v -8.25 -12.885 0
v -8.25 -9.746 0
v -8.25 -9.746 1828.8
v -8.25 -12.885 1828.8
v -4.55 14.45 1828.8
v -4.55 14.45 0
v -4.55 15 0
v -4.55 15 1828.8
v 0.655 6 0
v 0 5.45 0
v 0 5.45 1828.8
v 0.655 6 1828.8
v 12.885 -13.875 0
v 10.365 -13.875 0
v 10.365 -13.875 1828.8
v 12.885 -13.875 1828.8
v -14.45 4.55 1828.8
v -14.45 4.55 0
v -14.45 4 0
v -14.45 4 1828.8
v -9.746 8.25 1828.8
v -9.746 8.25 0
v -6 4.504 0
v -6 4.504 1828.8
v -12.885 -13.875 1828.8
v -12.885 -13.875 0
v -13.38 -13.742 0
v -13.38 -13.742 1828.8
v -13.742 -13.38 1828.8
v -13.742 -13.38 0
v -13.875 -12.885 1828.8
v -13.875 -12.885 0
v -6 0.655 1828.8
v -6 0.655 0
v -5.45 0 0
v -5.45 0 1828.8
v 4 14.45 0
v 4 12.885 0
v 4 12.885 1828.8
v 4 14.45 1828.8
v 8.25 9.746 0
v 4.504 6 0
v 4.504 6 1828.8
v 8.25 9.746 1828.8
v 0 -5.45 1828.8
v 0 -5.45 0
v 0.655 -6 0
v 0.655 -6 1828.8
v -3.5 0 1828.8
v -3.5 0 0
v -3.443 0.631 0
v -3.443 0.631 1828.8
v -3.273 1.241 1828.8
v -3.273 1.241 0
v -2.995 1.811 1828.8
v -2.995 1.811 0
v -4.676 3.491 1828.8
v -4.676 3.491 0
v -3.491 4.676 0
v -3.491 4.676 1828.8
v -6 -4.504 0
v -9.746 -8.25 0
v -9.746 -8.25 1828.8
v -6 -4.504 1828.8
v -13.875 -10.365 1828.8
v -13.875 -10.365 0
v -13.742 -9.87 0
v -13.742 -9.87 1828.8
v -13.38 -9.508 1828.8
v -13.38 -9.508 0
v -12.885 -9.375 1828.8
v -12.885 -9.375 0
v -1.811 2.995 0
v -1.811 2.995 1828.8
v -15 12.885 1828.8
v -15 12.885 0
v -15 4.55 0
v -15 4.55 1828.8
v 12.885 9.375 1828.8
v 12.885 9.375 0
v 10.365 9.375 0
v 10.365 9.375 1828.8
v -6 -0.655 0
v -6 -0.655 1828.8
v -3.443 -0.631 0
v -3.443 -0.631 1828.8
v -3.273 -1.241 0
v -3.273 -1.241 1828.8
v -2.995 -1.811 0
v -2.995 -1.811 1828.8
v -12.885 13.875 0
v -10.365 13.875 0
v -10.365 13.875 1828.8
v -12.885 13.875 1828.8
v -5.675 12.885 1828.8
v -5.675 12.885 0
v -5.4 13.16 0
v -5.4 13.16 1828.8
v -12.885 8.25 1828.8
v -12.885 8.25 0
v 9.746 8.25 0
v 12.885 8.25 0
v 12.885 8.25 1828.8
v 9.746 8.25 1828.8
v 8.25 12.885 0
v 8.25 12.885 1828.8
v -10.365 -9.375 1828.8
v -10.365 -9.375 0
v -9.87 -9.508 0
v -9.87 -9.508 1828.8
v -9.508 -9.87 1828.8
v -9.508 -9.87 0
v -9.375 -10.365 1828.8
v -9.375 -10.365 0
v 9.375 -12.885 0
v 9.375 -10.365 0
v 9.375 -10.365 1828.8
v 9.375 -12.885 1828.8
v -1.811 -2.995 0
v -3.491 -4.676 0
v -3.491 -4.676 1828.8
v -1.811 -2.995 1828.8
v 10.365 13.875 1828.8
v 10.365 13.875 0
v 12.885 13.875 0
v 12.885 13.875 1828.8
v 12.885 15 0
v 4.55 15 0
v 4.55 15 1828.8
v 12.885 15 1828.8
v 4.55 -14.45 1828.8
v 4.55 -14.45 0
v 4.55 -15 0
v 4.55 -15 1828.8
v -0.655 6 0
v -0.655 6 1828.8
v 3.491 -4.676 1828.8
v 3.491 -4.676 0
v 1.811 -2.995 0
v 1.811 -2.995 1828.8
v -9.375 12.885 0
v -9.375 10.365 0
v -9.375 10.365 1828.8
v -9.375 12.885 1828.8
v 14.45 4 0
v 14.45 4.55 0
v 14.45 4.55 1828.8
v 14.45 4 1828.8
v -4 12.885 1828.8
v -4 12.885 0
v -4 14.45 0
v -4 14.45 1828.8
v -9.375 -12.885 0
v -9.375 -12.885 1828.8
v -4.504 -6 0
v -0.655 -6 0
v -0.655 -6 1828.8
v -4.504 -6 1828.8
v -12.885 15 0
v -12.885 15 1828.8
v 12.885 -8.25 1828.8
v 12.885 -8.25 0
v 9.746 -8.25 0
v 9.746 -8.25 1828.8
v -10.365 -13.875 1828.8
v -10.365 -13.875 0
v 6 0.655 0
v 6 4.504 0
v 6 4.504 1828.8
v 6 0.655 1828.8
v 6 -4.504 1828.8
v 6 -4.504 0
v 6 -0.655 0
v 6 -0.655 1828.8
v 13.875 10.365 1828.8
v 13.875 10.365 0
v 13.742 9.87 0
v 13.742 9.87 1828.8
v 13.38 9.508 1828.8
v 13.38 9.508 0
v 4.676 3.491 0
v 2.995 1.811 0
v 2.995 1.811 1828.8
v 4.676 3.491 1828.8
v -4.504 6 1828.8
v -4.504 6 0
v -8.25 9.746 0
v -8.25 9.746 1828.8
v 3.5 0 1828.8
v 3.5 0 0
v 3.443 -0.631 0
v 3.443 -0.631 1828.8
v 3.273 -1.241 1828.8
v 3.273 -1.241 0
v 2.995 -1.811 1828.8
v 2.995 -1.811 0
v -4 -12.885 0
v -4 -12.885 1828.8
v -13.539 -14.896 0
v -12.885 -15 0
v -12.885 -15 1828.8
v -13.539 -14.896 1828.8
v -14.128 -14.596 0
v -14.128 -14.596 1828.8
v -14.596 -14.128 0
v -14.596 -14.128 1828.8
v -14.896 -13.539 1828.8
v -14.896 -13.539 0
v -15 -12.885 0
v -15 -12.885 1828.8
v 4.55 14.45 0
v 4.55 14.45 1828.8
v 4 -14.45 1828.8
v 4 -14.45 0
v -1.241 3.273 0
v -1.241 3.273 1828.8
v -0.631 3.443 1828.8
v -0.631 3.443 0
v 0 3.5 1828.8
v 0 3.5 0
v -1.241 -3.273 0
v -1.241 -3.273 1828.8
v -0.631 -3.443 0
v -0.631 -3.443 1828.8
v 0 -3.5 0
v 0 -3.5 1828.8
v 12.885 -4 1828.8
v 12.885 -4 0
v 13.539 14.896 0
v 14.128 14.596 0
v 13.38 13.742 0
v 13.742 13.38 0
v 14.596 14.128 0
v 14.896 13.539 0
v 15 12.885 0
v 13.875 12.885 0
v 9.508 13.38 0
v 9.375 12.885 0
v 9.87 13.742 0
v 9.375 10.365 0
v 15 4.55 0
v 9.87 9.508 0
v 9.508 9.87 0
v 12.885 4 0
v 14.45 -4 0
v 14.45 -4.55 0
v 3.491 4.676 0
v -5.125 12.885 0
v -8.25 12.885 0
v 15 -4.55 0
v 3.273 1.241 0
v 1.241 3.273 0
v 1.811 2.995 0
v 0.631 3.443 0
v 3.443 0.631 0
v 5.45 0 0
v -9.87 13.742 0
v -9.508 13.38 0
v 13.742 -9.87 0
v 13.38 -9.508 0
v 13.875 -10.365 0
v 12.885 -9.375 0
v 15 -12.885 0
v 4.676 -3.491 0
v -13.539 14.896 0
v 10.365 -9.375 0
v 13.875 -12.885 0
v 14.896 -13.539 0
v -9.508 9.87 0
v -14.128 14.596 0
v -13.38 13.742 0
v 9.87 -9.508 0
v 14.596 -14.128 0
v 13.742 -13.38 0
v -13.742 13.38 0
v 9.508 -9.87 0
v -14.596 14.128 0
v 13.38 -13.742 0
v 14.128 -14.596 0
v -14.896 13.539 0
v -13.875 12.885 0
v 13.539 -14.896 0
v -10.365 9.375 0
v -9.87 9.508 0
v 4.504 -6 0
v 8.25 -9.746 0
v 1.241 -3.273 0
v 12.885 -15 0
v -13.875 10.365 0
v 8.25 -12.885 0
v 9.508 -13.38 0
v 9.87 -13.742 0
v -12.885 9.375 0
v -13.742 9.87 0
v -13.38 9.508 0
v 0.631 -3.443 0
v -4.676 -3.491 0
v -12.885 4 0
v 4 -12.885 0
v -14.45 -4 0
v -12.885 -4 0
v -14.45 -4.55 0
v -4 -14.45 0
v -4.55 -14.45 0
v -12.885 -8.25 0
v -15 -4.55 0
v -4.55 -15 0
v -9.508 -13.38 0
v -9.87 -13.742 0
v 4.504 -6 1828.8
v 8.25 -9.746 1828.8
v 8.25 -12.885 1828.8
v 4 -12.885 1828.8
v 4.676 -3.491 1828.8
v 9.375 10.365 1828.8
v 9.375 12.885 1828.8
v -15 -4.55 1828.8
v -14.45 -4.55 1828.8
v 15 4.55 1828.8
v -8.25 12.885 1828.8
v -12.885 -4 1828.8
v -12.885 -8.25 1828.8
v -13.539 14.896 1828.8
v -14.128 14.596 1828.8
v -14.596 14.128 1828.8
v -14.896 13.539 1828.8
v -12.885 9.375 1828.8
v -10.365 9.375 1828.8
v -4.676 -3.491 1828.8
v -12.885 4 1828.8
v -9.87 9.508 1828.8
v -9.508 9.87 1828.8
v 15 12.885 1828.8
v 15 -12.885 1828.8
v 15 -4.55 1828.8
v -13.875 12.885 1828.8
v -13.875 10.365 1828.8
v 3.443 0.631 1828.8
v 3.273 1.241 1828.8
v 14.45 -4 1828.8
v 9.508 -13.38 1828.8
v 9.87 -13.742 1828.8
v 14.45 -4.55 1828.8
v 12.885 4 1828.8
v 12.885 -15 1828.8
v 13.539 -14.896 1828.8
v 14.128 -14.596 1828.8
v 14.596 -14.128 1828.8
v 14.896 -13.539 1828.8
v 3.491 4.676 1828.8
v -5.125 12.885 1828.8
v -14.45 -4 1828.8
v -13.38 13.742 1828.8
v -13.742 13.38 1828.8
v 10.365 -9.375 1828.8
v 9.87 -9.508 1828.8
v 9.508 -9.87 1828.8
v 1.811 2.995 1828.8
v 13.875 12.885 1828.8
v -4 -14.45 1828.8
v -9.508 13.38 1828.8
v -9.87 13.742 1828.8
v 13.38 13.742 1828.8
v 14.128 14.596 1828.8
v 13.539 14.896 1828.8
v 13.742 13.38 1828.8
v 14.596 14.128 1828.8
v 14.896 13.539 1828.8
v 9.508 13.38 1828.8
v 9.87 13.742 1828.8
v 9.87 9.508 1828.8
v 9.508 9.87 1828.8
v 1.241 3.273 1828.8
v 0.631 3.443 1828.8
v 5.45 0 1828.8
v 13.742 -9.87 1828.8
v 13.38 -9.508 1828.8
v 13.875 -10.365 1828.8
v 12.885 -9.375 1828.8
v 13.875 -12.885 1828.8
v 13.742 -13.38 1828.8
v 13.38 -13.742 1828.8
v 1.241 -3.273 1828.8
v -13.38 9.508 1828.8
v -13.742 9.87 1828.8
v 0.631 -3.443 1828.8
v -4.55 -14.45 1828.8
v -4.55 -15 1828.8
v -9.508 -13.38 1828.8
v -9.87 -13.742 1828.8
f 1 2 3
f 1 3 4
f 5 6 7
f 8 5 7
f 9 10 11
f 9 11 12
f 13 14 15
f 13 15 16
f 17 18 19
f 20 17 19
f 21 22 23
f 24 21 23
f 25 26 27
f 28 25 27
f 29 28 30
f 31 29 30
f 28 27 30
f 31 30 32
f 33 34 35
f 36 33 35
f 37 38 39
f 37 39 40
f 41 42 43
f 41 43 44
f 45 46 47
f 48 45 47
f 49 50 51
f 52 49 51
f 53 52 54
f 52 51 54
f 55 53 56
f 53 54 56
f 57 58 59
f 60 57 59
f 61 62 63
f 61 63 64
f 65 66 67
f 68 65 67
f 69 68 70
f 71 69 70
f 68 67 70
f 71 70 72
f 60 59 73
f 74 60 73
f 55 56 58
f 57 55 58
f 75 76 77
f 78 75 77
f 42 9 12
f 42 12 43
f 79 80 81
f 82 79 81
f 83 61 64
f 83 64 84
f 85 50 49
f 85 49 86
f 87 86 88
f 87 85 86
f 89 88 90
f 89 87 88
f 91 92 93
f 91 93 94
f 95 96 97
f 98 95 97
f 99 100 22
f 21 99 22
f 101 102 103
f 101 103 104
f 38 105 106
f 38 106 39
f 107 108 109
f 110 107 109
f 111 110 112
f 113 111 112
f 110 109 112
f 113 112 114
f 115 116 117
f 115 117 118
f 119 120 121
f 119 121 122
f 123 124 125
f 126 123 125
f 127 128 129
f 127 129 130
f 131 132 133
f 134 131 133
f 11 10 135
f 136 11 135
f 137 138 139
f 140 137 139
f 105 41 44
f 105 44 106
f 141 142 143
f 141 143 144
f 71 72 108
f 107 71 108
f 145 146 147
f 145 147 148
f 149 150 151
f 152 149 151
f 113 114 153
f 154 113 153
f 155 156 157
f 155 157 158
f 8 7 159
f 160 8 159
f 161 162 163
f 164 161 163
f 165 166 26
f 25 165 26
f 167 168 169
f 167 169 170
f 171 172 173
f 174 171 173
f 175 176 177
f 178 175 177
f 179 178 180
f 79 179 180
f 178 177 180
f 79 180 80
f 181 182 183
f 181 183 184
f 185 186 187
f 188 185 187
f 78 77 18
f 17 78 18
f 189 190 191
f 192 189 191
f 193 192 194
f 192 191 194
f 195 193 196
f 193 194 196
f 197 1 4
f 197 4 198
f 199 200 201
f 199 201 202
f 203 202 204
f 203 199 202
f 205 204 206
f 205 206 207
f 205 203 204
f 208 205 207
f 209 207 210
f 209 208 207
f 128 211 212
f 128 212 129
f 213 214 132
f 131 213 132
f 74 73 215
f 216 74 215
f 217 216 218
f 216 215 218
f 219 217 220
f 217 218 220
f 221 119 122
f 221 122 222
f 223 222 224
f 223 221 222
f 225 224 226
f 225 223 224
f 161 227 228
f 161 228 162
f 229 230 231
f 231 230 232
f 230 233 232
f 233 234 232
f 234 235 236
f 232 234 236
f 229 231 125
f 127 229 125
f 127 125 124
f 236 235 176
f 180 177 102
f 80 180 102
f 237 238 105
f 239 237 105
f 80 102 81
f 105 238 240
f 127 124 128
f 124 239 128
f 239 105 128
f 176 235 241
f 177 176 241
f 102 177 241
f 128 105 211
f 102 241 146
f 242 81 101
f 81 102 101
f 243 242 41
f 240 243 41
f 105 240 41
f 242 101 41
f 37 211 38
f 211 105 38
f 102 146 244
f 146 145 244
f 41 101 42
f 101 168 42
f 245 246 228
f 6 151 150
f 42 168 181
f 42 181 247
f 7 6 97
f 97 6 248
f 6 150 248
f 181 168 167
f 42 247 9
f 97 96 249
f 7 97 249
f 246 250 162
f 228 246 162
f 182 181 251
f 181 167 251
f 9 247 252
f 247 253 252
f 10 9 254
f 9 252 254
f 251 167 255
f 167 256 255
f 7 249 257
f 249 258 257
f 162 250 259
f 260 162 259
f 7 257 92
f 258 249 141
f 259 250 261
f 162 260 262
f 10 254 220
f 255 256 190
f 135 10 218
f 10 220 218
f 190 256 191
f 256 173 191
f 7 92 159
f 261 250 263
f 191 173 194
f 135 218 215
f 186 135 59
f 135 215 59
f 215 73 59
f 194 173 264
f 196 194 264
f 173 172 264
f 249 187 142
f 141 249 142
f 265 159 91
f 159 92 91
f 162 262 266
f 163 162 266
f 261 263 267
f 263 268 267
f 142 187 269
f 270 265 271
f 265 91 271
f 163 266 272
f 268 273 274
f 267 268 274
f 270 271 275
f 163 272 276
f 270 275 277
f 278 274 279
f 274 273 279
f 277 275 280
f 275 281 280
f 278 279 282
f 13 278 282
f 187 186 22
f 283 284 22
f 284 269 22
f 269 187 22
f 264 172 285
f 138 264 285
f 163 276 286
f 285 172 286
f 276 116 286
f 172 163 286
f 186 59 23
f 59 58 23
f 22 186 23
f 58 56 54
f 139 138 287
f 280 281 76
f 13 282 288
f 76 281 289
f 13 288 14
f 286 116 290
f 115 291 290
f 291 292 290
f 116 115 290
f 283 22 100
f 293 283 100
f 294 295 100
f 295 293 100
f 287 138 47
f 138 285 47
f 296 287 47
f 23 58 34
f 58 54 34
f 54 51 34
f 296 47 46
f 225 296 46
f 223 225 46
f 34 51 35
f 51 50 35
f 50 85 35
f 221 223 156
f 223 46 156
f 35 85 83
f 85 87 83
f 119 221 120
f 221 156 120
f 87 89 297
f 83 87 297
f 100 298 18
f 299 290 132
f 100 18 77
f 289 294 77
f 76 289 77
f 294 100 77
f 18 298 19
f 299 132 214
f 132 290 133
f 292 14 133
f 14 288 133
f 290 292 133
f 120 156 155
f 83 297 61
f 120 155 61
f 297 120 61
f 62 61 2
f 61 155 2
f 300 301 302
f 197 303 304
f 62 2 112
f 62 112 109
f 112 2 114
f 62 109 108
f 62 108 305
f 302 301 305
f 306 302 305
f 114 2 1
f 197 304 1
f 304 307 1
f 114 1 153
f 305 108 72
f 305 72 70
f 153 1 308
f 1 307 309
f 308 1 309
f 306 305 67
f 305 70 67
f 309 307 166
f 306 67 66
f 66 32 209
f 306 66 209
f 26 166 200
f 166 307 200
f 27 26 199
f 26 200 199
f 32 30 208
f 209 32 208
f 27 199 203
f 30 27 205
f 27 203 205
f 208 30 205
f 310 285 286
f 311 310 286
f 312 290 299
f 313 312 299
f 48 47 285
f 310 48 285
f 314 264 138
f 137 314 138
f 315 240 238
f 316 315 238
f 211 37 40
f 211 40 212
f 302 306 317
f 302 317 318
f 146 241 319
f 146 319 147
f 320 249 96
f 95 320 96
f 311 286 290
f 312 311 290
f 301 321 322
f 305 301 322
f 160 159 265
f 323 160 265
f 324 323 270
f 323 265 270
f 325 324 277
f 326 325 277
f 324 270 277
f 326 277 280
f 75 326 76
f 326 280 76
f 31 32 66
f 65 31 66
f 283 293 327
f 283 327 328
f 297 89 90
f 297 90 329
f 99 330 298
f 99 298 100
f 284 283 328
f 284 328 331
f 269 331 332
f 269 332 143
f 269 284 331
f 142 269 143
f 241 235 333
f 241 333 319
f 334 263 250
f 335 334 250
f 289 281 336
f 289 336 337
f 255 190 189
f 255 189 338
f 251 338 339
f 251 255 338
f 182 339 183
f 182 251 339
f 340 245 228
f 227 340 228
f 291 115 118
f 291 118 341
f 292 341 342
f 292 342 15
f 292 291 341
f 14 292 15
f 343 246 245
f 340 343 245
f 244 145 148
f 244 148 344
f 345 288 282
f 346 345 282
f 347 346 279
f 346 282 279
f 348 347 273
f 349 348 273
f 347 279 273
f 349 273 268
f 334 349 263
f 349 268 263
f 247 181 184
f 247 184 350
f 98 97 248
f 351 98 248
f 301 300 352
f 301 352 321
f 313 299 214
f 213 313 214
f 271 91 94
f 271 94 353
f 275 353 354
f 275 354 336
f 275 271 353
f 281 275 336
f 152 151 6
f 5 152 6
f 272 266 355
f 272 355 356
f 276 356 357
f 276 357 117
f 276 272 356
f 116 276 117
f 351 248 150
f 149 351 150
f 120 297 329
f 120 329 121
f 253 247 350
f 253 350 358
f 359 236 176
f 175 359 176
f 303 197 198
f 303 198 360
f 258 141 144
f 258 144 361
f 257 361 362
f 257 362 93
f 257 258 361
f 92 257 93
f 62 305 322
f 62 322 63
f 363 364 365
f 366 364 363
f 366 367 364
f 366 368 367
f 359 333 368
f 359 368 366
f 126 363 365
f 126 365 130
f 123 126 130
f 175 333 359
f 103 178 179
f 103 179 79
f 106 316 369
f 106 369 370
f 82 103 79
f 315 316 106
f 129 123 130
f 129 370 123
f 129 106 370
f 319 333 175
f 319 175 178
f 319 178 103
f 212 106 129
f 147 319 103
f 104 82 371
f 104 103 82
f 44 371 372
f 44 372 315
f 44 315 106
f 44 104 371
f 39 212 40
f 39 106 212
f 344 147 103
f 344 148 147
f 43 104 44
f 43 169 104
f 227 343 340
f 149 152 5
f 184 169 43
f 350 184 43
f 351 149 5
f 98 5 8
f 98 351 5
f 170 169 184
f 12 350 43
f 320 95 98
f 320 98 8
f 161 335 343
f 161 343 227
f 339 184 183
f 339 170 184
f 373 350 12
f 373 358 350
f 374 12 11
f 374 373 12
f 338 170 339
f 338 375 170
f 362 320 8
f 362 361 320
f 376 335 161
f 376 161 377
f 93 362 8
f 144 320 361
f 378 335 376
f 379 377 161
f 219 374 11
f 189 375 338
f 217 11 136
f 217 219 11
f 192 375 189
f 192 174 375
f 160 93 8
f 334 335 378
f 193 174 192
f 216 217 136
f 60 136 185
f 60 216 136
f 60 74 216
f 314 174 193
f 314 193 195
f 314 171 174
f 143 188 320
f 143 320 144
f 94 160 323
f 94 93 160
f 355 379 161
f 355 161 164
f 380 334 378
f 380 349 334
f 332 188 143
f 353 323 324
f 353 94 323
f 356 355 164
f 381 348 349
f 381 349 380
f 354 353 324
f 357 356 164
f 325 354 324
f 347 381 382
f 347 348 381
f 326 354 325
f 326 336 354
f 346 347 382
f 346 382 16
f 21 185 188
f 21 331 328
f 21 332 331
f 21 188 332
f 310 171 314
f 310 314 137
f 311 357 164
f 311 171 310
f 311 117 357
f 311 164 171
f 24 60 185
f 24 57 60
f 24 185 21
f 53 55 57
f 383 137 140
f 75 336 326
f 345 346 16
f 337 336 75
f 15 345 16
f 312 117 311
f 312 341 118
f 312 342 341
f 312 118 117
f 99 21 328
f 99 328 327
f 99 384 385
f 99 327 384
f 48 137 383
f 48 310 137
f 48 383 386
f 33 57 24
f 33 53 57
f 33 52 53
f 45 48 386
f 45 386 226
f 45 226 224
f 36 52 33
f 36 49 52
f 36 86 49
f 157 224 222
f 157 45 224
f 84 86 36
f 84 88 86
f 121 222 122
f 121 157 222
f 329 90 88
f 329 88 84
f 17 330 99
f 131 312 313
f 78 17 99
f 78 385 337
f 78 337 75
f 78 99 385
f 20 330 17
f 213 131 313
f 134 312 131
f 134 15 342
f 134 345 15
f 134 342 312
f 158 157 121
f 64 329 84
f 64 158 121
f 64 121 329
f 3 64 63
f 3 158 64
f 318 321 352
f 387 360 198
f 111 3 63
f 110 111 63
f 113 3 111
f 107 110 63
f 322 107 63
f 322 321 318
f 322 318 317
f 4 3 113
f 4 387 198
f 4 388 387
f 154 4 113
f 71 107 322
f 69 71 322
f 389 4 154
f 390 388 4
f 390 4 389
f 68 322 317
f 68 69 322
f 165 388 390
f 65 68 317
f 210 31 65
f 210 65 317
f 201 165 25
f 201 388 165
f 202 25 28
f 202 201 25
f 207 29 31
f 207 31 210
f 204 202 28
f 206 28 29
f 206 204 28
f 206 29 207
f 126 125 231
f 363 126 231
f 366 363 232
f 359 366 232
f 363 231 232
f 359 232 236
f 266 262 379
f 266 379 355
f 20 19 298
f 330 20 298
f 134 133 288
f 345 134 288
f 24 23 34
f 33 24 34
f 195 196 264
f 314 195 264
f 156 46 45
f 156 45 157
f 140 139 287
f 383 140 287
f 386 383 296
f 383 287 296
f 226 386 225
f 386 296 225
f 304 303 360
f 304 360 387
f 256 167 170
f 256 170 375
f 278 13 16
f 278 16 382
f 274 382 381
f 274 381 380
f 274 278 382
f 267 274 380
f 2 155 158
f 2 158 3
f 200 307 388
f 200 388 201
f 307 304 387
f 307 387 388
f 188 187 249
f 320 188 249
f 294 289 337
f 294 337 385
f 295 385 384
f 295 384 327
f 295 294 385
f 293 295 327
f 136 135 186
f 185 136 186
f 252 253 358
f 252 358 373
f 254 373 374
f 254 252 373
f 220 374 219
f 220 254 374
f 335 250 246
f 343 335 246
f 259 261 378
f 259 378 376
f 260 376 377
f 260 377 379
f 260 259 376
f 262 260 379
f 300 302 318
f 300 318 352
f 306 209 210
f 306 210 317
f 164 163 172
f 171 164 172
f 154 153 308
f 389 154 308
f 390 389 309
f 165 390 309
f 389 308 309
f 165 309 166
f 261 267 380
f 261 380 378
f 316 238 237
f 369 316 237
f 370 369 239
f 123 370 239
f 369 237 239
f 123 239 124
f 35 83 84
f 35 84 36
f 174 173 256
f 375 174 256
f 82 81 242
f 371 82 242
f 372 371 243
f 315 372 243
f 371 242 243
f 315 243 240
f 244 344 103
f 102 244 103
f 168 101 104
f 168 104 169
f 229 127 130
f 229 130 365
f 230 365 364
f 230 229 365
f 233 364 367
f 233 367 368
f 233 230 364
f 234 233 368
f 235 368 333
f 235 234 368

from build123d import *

# Parameters (mm, degrees)
BOSS_EXTRUDE1_DEPTH     = 1828.8
CUT_EXTRUDE1_DEPTH      = 1
CUT_EXTRUDE1_DEPTH_BACK = 1829.8


with BuildPart() as part:
    # Sketch4 → Boss-Extrude1 (new body)
    with BuildSketch(Plane.XY):
        with BuildLine():
            Line((0, -5.45), (0.655464476, -6))
            Line((0.655464476, -6), (4.504469158, -6))
            Line((4.504469158, -6), (8.25, -9.745530842))
            Line((8.25, -9.745530842), (8.25, -12.885))
            Line((8.25, -12.885), (4, -12.885))
            Line((4, -12.885), (4, -14.45))
            Line((4, -14.45), (4.55, -14.45))
            Line((4.55, -14.45), (4.55, -15))
            Line((4.55, -15), (12.885, -15))
            ThreePointArc((12.885, -15), (14.380530842, -14.380530842), (15, -12.885))
            Line((15, -12.885), (15, -4.55))
            Line((15, -4.55), (14.45, -4.55))
            Line((14.45, -4.55), (14.45, -4))
            Line((14.45, -4), (12.885, -4))
            Line((12.885, -4), (12.885, -8.25))
            Line((12.885, -8.25), (9.745530842, -8.25))
            Line((9.745530842, -8.25), (6, -4.504469158))
            Line((6, -4.504469158), (6, -0.655464476))
            Line((6, -0.655464476), (5.45, 0))
            Line((5.45, 0), (3.5, 0))
            ThreePointArc((3.5, 0), (3.371433308, -0.939913534), (2.995178599, -1.81077474))
            Line((2.995178599, -1.81077474), (4.675743591, -3.491339732))
            Line((4.675743591, -3.491339732), (3.491339732, -4.675743591))
            Line((3.491339732, -4.675743591), (1.81077474, -2.995178599))
            ThreePointArc((1.81077474, -2.995178599), (0.939913534, -3.371433308), (0, -3.5))
            Line((0, -3.5), (0, -5.45))
        make_face()
        with BuildLine():
            Line((9.375, -10.365), (9.375, -12.885))
            ThreePointArc((9.375, -12.885), (9.664964287, -13.585035713), (10.365, -13.875))
            Line((10.365, -13.875), (12.885, -13.875))
            ThreePointArc((12.885, -13.875), (13.585035713, -13.585035713), (13.875, -12.885))
            Line((13.875, -12.885), (13.875, -10.365))
            ThreePointArc((13.875, -10.365), (13.585035713, -9.664964287), (12.885, -9.375))
            Line((12.885, -9.375), (10.365, -9.375))
            ThreePointArc((10.365, -9.375), (9.664964287, -9.664964287), (9.375, -10.365))
        make_face(mode=Mode.SUBTRACT)
    extrude(amount=BOSS_EXTRUDE1_DEPTH)

    # Mirror1: part across plane


with BuildPart() as part_1:
    add(part.part)
    add(part.part.mirror(Plane(origin=(0, 0, 0), x_dir=(0, 0, 1), z_dir=(1, 0, 0))))

    # Mirror2: part across plane


with BuildPart() as part_2:
    add(part_1.part)
    add(part_1.part.mirror(Plane.ZX))

    # Sketch5 → Cut-Extrude1 (cut, two sides)
    with BuildSketch(Plane.XY.offset(1828.8)) as cut_extrude1_sk:
        Polygon((-5.675, 12.885), (-5.4, 13.16), (-5.125, 12.885), align=None)
    extrude(amount=CUT_EXTRUDE1_DEPTH, mode=Mode.SUBTRACT)
    extrude(cut_extrude1_sk.sketch, amount=-CUT_EXTRUDE1_DEPTH_BACK, mode=Mode.SUBTRACT)


solid = part_2.part
